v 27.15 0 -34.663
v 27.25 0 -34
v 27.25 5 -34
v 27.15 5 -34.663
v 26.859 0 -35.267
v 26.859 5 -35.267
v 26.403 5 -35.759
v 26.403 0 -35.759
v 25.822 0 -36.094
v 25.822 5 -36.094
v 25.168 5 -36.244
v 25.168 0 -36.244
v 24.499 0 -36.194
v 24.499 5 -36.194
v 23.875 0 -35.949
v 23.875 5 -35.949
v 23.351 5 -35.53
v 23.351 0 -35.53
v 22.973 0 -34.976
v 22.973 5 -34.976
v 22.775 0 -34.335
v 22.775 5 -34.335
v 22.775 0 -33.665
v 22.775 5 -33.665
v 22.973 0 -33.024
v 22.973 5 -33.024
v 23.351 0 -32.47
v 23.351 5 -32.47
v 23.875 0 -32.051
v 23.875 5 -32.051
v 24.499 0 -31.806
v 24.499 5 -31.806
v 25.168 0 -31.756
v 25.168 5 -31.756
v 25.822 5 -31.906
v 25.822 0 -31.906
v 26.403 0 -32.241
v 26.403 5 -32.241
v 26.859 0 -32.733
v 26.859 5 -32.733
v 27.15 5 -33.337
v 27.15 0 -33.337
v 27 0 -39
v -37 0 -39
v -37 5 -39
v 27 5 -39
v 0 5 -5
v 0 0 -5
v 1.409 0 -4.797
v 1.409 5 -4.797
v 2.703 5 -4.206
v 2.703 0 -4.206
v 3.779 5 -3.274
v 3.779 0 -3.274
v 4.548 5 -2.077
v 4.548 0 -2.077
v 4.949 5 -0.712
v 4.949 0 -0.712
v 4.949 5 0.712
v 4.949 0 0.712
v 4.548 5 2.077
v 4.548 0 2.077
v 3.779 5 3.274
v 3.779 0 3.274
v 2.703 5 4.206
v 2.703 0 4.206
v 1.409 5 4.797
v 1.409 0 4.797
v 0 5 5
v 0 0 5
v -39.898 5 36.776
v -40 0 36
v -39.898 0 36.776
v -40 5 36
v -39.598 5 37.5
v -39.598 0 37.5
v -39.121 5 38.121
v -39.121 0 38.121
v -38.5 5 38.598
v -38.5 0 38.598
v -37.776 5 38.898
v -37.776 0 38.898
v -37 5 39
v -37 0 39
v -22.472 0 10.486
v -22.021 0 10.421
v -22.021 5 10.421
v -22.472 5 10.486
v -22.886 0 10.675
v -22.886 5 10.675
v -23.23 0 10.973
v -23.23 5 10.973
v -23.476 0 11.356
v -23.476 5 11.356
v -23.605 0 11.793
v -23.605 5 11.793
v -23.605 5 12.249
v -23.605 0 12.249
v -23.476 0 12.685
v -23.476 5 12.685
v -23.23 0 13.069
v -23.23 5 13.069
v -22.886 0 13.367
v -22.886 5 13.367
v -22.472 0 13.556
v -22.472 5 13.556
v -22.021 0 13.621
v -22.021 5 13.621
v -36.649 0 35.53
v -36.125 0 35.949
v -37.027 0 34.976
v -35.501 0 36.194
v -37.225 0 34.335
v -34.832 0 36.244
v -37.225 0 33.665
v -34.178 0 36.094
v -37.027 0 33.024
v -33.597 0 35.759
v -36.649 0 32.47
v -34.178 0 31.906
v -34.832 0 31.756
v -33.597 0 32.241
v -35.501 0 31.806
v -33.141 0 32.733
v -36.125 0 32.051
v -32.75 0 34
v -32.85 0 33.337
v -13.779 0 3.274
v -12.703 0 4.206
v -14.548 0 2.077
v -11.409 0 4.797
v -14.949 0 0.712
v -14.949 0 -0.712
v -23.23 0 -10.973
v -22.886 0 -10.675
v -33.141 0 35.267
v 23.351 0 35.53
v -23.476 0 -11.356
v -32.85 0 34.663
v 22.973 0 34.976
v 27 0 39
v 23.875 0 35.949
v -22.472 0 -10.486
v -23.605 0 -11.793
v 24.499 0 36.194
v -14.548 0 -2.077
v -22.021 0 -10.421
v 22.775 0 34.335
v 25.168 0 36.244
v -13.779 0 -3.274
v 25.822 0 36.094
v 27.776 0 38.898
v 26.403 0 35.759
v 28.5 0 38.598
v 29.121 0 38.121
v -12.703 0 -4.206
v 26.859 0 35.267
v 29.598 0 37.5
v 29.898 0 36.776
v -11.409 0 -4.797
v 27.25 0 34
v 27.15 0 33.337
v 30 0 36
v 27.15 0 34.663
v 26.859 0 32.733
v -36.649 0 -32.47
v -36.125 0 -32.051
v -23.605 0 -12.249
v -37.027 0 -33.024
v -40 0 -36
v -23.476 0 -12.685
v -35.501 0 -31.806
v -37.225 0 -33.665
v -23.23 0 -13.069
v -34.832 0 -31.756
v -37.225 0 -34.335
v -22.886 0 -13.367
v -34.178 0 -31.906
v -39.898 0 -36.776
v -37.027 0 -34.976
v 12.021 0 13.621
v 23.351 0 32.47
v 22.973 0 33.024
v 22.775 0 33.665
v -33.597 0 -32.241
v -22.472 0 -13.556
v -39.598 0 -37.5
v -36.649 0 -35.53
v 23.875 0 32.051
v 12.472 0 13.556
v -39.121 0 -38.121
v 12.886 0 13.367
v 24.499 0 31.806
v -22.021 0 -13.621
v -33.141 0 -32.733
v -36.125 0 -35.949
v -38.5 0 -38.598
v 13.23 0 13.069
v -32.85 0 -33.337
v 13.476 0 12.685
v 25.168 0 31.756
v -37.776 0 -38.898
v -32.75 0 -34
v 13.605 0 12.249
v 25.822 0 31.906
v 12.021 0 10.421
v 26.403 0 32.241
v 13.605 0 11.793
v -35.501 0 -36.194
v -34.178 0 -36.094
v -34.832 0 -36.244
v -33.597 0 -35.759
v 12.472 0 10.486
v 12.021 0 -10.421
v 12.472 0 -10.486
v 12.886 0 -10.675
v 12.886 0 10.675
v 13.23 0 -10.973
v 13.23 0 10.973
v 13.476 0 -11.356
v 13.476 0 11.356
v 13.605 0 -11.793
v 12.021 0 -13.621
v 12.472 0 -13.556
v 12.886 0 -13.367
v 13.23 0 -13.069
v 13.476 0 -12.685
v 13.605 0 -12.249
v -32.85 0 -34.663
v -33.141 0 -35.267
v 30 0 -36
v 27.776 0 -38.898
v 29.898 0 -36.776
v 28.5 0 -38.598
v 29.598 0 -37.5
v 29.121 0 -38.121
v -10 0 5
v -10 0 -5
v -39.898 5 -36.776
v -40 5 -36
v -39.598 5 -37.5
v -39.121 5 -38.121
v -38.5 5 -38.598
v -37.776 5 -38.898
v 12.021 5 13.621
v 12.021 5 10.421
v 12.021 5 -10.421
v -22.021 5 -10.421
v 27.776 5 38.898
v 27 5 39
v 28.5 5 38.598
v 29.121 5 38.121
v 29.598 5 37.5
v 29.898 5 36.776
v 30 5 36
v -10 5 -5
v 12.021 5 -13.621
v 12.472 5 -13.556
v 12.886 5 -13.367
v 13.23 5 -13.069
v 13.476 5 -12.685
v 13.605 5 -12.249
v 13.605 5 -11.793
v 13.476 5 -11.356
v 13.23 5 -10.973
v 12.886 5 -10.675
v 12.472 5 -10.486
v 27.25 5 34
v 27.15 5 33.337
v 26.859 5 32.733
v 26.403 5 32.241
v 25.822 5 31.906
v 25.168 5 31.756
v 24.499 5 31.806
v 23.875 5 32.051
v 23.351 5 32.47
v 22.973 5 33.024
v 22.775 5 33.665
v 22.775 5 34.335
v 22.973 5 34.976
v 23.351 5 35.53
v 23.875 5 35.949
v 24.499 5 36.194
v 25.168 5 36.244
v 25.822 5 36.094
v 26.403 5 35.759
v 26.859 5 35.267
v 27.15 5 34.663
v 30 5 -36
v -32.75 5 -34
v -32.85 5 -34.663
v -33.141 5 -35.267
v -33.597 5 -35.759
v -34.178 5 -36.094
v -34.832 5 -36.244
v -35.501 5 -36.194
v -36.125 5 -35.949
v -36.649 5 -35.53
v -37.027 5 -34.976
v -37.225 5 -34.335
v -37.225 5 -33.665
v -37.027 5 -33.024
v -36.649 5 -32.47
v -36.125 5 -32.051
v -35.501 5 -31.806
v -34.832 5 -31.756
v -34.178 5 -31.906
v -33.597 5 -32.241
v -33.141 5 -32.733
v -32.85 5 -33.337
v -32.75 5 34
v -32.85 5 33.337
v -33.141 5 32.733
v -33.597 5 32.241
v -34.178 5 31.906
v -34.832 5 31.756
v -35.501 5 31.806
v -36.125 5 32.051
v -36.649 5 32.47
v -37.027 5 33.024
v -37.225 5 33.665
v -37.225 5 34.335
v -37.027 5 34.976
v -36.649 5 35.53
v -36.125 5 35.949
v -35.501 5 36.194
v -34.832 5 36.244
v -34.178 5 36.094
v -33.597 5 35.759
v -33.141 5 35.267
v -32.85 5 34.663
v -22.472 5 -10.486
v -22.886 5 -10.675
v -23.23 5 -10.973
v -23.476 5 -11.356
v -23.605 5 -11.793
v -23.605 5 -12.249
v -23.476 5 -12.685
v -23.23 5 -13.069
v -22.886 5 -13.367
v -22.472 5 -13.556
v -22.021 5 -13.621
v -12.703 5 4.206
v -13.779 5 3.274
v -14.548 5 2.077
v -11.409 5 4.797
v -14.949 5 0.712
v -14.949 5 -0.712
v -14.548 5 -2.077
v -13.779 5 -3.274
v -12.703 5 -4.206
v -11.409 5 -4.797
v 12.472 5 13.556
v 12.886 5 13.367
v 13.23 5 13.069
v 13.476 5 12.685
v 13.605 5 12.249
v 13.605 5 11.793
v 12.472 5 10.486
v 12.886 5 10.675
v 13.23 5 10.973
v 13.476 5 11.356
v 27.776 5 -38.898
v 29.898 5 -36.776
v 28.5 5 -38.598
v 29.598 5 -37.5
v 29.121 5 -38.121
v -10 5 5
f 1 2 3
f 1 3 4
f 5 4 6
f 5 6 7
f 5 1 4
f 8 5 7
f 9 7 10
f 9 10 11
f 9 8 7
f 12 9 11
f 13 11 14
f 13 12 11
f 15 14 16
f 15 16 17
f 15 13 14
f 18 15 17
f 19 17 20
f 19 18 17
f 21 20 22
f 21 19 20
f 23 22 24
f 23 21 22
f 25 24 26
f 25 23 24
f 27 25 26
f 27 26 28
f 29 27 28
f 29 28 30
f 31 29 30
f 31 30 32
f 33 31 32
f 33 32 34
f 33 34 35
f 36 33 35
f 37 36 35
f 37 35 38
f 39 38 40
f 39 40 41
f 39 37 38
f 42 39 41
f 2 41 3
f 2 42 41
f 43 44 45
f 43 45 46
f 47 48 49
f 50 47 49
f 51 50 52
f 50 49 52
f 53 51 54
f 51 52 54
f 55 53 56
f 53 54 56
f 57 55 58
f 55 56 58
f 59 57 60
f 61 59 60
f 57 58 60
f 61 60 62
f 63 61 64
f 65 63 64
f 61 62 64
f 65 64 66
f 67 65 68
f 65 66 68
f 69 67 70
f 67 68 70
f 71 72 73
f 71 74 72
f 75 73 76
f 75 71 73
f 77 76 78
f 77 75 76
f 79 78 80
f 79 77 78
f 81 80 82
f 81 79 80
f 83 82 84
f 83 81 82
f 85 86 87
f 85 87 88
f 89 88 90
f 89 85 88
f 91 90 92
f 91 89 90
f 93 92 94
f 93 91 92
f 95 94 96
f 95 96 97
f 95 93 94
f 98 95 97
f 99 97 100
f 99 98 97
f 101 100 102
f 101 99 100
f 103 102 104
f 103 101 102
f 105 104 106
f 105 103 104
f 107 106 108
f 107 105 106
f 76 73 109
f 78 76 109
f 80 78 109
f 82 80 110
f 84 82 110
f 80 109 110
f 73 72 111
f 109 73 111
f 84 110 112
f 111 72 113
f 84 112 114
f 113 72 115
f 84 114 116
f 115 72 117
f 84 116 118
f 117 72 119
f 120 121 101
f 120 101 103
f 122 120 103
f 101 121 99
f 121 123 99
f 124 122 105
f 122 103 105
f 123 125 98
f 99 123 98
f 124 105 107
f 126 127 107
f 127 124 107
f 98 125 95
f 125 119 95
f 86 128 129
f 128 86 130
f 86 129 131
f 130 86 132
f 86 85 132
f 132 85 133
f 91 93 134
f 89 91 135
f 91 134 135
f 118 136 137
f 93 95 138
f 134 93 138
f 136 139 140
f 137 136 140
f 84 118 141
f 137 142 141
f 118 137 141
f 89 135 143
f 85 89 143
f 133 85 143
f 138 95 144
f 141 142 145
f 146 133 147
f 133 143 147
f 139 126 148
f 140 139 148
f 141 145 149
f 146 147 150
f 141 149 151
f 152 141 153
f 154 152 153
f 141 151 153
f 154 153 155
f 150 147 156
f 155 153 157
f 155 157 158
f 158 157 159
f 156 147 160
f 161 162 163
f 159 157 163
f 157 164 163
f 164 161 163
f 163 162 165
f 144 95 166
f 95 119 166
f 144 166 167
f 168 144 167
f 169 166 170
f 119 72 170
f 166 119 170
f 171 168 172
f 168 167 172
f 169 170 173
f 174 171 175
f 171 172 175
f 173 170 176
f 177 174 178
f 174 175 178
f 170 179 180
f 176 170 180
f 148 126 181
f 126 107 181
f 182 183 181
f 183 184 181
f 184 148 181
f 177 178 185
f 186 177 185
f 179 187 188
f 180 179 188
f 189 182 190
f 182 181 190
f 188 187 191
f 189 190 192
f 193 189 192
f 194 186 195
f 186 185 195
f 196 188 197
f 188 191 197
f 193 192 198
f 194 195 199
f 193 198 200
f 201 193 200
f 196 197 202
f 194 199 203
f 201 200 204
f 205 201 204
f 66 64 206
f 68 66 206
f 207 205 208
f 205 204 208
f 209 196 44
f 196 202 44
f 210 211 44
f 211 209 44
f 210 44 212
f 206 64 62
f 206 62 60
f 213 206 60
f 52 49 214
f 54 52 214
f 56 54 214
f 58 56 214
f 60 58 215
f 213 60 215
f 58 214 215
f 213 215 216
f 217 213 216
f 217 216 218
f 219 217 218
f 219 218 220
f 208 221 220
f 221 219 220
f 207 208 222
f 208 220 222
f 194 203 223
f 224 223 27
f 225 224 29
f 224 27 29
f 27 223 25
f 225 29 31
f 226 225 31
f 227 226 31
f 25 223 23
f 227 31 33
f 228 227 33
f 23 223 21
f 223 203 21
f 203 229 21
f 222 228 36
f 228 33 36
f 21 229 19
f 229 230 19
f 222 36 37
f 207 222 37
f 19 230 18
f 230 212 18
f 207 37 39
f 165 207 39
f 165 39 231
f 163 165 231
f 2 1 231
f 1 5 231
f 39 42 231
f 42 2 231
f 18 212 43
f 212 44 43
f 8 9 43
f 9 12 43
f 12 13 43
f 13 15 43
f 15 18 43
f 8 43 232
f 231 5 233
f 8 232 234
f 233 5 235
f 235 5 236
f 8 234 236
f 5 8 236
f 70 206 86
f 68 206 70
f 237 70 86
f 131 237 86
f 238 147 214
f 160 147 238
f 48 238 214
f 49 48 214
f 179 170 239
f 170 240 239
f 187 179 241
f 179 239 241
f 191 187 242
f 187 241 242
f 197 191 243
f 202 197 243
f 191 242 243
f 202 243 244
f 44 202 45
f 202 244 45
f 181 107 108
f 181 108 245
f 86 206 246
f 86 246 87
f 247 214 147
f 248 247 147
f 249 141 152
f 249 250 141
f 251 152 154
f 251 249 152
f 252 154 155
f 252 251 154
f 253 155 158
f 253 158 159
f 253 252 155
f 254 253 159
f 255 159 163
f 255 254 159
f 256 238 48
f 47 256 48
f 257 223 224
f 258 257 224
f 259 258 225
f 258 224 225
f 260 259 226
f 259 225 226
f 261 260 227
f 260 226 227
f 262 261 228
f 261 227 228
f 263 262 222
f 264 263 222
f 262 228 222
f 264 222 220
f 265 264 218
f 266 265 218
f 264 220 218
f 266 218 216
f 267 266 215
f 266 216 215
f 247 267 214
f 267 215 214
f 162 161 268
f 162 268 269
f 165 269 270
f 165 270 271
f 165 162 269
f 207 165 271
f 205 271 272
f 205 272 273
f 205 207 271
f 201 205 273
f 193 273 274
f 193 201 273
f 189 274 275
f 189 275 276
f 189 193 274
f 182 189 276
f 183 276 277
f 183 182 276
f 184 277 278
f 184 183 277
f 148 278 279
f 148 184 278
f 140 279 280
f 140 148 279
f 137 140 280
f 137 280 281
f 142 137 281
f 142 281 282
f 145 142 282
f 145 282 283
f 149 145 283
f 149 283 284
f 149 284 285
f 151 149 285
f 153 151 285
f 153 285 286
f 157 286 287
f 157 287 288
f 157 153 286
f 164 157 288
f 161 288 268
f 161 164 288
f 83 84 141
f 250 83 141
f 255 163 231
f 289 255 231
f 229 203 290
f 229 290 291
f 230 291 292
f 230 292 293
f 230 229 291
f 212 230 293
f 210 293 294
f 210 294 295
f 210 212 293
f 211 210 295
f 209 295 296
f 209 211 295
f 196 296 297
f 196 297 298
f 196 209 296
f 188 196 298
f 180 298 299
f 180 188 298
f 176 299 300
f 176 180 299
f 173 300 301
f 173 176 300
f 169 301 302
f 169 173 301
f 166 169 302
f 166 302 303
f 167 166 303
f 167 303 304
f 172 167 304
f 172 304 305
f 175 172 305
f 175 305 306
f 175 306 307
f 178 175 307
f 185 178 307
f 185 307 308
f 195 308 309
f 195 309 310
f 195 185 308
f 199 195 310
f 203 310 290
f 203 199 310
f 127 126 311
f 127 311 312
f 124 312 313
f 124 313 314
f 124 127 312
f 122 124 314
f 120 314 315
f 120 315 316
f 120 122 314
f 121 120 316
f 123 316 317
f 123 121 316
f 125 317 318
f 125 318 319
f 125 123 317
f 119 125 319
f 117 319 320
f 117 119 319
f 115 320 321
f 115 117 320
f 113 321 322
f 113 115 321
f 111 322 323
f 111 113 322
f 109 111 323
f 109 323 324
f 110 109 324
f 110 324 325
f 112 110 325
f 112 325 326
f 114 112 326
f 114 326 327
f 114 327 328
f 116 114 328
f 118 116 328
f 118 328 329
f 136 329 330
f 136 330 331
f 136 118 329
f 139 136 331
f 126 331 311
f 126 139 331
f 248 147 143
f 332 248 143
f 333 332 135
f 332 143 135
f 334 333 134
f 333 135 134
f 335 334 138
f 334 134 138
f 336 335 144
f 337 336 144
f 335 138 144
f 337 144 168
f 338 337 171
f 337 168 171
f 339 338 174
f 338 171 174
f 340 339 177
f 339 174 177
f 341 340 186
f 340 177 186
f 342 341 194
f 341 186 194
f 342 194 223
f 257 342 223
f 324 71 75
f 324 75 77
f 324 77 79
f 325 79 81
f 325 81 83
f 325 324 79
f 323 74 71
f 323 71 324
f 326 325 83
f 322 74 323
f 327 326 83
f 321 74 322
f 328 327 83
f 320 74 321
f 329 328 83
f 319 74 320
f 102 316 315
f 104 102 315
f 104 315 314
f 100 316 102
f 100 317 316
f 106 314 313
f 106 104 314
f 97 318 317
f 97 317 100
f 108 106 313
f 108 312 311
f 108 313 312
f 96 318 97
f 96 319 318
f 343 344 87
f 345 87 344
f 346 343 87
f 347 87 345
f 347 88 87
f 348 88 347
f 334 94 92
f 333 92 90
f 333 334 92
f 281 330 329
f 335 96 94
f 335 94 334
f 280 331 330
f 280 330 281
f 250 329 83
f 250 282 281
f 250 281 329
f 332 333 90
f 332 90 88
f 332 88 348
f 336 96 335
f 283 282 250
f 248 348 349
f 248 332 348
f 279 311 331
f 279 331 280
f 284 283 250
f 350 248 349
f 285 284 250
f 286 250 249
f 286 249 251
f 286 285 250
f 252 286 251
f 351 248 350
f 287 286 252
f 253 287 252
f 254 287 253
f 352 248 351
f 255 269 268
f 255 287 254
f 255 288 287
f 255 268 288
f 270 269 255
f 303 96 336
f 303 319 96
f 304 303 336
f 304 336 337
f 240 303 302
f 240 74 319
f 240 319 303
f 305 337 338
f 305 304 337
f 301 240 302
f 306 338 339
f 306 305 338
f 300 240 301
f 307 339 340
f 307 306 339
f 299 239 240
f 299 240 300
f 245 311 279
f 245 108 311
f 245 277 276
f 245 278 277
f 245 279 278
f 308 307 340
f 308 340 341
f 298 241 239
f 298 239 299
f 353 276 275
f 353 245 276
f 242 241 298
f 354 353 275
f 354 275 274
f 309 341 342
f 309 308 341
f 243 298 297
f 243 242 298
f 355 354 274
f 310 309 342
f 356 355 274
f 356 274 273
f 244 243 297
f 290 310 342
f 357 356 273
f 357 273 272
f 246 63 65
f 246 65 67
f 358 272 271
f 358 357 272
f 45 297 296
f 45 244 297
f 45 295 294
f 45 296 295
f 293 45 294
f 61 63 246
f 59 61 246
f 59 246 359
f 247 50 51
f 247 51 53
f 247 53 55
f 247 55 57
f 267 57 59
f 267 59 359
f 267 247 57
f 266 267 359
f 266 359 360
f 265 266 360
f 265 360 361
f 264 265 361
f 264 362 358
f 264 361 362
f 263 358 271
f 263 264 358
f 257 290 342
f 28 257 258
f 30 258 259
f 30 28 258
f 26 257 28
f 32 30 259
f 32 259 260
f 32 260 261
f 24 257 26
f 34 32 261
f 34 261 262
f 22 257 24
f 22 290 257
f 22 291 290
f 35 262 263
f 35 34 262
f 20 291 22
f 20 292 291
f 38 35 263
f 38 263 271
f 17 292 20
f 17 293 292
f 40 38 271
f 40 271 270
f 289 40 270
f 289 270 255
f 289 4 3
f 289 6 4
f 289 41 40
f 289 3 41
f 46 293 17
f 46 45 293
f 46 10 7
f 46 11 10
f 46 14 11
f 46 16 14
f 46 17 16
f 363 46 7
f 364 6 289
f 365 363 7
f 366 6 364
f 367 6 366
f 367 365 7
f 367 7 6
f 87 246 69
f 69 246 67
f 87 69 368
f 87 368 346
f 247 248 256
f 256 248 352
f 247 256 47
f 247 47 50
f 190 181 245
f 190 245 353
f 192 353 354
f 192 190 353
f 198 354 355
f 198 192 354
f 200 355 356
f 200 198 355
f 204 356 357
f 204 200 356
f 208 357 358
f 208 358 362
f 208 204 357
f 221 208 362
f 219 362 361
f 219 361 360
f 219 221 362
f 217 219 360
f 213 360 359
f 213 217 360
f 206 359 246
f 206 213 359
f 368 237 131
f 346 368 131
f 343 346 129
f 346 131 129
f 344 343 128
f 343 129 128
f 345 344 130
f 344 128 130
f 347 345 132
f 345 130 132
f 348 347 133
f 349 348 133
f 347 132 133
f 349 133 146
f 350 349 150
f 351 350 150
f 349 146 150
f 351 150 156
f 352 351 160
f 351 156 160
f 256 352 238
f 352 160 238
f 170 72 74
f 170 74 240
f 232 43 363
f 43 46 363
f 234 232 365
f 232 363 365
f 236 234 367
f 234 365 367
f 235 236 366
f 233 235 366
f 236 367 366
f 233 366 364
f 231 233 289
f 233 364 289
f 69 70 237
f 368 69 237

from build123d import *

# Parameters (mm, degrees)
SKETCH1_W           = 70
SKETCH1_H           = 78
SKETCH1_R           = 2.25
BOSS_EXTRUDE1_DEPTH = 5
FILLET1_R           = 3


with BuildPart() as part:
    # Sketch1 → Boss-Extrude1 (new body)
    with BuildSketch(Plane(origin=(0, 0, 0), x_dir=(1, 0, 0), z_dir=(0, 1, 0))):
        with Locations((-5, 0)):
            Rectangle(SKETCH1_W, SKETCH1_H)
        with Locations((-35, 34)):
            Circle(SKETCH1_R, mode=Mode.SUBTRACT)
        with Locations((25, 34)):
            Circle(SKETCH1_R, mode=Mode.SUBTRACT)
        with Locations((25, -34)):
            Circle(SKETCH1_R, mode=Mode.SUBTRACT)
        with Locations((-35, -34)):
            Circle(SKETCH1_R, mode=Mode.SUBTRACT)
        with BuildLine():
            Line((-22.02081528, 13.62081528), (12.02081528, 13.62081528))
            ThreePointArc((12.02081528, 13.62081528), (13.62081528, 12.02081528), (12.02081528, 10.42081528))
            Line((12.02081528, 10.42081528), (-22.02081528, 10.42081528))
            ThreePointArc((-22.02081528, 10.42081528), (-23.62081528, 12.02081528), (-22.02081528, 13.62081528))
        make_face(mode=Mode.SUBTRACT)
        with BuildLine():
            Line((-22.02081528, -13.62081528), (12.02081528, -13.62081528))
            ThreePointArc((12.02081528, -13.62081528), (13.62081528, -12.02081528), (12.02081528, -10.42081528))
            Line((12.02081528, -10.42081528), (-22.02081528, -10.42081528))
            ThreePointArc((-22.02081528, -10.42081528), (-23.62081528, -12.02081528), (-22.02081528, -13.62081528))
        make_face(mode=Mode.SUBTRACT)
        with BuildLine():
            Line((-10, 5), (0, 5))
            ThreePointArc((0, 5), (5, 0), (0, -5))
            Line((0, -5), (-10, -5))
            ThreePointArc((-10, -5), (-15, 0), (-10, 5))
        make_face(mode=Mode.SUBTRACT)
    extrude(amount=BOSS_EXTRUDE1_DEPTH)

    # Fillet1
    fillet1_edges = [part.edges().sort_by_distance(p)[0] for p in [
        (30, 2.5, -39),
        (30, 2.5, 39),
        (-40, 2.5, 39),
        (-40, 2.5, -39),
    ]]
    fillet(fillet1_edges, radius=FILLET1_R)


solid = part.part
